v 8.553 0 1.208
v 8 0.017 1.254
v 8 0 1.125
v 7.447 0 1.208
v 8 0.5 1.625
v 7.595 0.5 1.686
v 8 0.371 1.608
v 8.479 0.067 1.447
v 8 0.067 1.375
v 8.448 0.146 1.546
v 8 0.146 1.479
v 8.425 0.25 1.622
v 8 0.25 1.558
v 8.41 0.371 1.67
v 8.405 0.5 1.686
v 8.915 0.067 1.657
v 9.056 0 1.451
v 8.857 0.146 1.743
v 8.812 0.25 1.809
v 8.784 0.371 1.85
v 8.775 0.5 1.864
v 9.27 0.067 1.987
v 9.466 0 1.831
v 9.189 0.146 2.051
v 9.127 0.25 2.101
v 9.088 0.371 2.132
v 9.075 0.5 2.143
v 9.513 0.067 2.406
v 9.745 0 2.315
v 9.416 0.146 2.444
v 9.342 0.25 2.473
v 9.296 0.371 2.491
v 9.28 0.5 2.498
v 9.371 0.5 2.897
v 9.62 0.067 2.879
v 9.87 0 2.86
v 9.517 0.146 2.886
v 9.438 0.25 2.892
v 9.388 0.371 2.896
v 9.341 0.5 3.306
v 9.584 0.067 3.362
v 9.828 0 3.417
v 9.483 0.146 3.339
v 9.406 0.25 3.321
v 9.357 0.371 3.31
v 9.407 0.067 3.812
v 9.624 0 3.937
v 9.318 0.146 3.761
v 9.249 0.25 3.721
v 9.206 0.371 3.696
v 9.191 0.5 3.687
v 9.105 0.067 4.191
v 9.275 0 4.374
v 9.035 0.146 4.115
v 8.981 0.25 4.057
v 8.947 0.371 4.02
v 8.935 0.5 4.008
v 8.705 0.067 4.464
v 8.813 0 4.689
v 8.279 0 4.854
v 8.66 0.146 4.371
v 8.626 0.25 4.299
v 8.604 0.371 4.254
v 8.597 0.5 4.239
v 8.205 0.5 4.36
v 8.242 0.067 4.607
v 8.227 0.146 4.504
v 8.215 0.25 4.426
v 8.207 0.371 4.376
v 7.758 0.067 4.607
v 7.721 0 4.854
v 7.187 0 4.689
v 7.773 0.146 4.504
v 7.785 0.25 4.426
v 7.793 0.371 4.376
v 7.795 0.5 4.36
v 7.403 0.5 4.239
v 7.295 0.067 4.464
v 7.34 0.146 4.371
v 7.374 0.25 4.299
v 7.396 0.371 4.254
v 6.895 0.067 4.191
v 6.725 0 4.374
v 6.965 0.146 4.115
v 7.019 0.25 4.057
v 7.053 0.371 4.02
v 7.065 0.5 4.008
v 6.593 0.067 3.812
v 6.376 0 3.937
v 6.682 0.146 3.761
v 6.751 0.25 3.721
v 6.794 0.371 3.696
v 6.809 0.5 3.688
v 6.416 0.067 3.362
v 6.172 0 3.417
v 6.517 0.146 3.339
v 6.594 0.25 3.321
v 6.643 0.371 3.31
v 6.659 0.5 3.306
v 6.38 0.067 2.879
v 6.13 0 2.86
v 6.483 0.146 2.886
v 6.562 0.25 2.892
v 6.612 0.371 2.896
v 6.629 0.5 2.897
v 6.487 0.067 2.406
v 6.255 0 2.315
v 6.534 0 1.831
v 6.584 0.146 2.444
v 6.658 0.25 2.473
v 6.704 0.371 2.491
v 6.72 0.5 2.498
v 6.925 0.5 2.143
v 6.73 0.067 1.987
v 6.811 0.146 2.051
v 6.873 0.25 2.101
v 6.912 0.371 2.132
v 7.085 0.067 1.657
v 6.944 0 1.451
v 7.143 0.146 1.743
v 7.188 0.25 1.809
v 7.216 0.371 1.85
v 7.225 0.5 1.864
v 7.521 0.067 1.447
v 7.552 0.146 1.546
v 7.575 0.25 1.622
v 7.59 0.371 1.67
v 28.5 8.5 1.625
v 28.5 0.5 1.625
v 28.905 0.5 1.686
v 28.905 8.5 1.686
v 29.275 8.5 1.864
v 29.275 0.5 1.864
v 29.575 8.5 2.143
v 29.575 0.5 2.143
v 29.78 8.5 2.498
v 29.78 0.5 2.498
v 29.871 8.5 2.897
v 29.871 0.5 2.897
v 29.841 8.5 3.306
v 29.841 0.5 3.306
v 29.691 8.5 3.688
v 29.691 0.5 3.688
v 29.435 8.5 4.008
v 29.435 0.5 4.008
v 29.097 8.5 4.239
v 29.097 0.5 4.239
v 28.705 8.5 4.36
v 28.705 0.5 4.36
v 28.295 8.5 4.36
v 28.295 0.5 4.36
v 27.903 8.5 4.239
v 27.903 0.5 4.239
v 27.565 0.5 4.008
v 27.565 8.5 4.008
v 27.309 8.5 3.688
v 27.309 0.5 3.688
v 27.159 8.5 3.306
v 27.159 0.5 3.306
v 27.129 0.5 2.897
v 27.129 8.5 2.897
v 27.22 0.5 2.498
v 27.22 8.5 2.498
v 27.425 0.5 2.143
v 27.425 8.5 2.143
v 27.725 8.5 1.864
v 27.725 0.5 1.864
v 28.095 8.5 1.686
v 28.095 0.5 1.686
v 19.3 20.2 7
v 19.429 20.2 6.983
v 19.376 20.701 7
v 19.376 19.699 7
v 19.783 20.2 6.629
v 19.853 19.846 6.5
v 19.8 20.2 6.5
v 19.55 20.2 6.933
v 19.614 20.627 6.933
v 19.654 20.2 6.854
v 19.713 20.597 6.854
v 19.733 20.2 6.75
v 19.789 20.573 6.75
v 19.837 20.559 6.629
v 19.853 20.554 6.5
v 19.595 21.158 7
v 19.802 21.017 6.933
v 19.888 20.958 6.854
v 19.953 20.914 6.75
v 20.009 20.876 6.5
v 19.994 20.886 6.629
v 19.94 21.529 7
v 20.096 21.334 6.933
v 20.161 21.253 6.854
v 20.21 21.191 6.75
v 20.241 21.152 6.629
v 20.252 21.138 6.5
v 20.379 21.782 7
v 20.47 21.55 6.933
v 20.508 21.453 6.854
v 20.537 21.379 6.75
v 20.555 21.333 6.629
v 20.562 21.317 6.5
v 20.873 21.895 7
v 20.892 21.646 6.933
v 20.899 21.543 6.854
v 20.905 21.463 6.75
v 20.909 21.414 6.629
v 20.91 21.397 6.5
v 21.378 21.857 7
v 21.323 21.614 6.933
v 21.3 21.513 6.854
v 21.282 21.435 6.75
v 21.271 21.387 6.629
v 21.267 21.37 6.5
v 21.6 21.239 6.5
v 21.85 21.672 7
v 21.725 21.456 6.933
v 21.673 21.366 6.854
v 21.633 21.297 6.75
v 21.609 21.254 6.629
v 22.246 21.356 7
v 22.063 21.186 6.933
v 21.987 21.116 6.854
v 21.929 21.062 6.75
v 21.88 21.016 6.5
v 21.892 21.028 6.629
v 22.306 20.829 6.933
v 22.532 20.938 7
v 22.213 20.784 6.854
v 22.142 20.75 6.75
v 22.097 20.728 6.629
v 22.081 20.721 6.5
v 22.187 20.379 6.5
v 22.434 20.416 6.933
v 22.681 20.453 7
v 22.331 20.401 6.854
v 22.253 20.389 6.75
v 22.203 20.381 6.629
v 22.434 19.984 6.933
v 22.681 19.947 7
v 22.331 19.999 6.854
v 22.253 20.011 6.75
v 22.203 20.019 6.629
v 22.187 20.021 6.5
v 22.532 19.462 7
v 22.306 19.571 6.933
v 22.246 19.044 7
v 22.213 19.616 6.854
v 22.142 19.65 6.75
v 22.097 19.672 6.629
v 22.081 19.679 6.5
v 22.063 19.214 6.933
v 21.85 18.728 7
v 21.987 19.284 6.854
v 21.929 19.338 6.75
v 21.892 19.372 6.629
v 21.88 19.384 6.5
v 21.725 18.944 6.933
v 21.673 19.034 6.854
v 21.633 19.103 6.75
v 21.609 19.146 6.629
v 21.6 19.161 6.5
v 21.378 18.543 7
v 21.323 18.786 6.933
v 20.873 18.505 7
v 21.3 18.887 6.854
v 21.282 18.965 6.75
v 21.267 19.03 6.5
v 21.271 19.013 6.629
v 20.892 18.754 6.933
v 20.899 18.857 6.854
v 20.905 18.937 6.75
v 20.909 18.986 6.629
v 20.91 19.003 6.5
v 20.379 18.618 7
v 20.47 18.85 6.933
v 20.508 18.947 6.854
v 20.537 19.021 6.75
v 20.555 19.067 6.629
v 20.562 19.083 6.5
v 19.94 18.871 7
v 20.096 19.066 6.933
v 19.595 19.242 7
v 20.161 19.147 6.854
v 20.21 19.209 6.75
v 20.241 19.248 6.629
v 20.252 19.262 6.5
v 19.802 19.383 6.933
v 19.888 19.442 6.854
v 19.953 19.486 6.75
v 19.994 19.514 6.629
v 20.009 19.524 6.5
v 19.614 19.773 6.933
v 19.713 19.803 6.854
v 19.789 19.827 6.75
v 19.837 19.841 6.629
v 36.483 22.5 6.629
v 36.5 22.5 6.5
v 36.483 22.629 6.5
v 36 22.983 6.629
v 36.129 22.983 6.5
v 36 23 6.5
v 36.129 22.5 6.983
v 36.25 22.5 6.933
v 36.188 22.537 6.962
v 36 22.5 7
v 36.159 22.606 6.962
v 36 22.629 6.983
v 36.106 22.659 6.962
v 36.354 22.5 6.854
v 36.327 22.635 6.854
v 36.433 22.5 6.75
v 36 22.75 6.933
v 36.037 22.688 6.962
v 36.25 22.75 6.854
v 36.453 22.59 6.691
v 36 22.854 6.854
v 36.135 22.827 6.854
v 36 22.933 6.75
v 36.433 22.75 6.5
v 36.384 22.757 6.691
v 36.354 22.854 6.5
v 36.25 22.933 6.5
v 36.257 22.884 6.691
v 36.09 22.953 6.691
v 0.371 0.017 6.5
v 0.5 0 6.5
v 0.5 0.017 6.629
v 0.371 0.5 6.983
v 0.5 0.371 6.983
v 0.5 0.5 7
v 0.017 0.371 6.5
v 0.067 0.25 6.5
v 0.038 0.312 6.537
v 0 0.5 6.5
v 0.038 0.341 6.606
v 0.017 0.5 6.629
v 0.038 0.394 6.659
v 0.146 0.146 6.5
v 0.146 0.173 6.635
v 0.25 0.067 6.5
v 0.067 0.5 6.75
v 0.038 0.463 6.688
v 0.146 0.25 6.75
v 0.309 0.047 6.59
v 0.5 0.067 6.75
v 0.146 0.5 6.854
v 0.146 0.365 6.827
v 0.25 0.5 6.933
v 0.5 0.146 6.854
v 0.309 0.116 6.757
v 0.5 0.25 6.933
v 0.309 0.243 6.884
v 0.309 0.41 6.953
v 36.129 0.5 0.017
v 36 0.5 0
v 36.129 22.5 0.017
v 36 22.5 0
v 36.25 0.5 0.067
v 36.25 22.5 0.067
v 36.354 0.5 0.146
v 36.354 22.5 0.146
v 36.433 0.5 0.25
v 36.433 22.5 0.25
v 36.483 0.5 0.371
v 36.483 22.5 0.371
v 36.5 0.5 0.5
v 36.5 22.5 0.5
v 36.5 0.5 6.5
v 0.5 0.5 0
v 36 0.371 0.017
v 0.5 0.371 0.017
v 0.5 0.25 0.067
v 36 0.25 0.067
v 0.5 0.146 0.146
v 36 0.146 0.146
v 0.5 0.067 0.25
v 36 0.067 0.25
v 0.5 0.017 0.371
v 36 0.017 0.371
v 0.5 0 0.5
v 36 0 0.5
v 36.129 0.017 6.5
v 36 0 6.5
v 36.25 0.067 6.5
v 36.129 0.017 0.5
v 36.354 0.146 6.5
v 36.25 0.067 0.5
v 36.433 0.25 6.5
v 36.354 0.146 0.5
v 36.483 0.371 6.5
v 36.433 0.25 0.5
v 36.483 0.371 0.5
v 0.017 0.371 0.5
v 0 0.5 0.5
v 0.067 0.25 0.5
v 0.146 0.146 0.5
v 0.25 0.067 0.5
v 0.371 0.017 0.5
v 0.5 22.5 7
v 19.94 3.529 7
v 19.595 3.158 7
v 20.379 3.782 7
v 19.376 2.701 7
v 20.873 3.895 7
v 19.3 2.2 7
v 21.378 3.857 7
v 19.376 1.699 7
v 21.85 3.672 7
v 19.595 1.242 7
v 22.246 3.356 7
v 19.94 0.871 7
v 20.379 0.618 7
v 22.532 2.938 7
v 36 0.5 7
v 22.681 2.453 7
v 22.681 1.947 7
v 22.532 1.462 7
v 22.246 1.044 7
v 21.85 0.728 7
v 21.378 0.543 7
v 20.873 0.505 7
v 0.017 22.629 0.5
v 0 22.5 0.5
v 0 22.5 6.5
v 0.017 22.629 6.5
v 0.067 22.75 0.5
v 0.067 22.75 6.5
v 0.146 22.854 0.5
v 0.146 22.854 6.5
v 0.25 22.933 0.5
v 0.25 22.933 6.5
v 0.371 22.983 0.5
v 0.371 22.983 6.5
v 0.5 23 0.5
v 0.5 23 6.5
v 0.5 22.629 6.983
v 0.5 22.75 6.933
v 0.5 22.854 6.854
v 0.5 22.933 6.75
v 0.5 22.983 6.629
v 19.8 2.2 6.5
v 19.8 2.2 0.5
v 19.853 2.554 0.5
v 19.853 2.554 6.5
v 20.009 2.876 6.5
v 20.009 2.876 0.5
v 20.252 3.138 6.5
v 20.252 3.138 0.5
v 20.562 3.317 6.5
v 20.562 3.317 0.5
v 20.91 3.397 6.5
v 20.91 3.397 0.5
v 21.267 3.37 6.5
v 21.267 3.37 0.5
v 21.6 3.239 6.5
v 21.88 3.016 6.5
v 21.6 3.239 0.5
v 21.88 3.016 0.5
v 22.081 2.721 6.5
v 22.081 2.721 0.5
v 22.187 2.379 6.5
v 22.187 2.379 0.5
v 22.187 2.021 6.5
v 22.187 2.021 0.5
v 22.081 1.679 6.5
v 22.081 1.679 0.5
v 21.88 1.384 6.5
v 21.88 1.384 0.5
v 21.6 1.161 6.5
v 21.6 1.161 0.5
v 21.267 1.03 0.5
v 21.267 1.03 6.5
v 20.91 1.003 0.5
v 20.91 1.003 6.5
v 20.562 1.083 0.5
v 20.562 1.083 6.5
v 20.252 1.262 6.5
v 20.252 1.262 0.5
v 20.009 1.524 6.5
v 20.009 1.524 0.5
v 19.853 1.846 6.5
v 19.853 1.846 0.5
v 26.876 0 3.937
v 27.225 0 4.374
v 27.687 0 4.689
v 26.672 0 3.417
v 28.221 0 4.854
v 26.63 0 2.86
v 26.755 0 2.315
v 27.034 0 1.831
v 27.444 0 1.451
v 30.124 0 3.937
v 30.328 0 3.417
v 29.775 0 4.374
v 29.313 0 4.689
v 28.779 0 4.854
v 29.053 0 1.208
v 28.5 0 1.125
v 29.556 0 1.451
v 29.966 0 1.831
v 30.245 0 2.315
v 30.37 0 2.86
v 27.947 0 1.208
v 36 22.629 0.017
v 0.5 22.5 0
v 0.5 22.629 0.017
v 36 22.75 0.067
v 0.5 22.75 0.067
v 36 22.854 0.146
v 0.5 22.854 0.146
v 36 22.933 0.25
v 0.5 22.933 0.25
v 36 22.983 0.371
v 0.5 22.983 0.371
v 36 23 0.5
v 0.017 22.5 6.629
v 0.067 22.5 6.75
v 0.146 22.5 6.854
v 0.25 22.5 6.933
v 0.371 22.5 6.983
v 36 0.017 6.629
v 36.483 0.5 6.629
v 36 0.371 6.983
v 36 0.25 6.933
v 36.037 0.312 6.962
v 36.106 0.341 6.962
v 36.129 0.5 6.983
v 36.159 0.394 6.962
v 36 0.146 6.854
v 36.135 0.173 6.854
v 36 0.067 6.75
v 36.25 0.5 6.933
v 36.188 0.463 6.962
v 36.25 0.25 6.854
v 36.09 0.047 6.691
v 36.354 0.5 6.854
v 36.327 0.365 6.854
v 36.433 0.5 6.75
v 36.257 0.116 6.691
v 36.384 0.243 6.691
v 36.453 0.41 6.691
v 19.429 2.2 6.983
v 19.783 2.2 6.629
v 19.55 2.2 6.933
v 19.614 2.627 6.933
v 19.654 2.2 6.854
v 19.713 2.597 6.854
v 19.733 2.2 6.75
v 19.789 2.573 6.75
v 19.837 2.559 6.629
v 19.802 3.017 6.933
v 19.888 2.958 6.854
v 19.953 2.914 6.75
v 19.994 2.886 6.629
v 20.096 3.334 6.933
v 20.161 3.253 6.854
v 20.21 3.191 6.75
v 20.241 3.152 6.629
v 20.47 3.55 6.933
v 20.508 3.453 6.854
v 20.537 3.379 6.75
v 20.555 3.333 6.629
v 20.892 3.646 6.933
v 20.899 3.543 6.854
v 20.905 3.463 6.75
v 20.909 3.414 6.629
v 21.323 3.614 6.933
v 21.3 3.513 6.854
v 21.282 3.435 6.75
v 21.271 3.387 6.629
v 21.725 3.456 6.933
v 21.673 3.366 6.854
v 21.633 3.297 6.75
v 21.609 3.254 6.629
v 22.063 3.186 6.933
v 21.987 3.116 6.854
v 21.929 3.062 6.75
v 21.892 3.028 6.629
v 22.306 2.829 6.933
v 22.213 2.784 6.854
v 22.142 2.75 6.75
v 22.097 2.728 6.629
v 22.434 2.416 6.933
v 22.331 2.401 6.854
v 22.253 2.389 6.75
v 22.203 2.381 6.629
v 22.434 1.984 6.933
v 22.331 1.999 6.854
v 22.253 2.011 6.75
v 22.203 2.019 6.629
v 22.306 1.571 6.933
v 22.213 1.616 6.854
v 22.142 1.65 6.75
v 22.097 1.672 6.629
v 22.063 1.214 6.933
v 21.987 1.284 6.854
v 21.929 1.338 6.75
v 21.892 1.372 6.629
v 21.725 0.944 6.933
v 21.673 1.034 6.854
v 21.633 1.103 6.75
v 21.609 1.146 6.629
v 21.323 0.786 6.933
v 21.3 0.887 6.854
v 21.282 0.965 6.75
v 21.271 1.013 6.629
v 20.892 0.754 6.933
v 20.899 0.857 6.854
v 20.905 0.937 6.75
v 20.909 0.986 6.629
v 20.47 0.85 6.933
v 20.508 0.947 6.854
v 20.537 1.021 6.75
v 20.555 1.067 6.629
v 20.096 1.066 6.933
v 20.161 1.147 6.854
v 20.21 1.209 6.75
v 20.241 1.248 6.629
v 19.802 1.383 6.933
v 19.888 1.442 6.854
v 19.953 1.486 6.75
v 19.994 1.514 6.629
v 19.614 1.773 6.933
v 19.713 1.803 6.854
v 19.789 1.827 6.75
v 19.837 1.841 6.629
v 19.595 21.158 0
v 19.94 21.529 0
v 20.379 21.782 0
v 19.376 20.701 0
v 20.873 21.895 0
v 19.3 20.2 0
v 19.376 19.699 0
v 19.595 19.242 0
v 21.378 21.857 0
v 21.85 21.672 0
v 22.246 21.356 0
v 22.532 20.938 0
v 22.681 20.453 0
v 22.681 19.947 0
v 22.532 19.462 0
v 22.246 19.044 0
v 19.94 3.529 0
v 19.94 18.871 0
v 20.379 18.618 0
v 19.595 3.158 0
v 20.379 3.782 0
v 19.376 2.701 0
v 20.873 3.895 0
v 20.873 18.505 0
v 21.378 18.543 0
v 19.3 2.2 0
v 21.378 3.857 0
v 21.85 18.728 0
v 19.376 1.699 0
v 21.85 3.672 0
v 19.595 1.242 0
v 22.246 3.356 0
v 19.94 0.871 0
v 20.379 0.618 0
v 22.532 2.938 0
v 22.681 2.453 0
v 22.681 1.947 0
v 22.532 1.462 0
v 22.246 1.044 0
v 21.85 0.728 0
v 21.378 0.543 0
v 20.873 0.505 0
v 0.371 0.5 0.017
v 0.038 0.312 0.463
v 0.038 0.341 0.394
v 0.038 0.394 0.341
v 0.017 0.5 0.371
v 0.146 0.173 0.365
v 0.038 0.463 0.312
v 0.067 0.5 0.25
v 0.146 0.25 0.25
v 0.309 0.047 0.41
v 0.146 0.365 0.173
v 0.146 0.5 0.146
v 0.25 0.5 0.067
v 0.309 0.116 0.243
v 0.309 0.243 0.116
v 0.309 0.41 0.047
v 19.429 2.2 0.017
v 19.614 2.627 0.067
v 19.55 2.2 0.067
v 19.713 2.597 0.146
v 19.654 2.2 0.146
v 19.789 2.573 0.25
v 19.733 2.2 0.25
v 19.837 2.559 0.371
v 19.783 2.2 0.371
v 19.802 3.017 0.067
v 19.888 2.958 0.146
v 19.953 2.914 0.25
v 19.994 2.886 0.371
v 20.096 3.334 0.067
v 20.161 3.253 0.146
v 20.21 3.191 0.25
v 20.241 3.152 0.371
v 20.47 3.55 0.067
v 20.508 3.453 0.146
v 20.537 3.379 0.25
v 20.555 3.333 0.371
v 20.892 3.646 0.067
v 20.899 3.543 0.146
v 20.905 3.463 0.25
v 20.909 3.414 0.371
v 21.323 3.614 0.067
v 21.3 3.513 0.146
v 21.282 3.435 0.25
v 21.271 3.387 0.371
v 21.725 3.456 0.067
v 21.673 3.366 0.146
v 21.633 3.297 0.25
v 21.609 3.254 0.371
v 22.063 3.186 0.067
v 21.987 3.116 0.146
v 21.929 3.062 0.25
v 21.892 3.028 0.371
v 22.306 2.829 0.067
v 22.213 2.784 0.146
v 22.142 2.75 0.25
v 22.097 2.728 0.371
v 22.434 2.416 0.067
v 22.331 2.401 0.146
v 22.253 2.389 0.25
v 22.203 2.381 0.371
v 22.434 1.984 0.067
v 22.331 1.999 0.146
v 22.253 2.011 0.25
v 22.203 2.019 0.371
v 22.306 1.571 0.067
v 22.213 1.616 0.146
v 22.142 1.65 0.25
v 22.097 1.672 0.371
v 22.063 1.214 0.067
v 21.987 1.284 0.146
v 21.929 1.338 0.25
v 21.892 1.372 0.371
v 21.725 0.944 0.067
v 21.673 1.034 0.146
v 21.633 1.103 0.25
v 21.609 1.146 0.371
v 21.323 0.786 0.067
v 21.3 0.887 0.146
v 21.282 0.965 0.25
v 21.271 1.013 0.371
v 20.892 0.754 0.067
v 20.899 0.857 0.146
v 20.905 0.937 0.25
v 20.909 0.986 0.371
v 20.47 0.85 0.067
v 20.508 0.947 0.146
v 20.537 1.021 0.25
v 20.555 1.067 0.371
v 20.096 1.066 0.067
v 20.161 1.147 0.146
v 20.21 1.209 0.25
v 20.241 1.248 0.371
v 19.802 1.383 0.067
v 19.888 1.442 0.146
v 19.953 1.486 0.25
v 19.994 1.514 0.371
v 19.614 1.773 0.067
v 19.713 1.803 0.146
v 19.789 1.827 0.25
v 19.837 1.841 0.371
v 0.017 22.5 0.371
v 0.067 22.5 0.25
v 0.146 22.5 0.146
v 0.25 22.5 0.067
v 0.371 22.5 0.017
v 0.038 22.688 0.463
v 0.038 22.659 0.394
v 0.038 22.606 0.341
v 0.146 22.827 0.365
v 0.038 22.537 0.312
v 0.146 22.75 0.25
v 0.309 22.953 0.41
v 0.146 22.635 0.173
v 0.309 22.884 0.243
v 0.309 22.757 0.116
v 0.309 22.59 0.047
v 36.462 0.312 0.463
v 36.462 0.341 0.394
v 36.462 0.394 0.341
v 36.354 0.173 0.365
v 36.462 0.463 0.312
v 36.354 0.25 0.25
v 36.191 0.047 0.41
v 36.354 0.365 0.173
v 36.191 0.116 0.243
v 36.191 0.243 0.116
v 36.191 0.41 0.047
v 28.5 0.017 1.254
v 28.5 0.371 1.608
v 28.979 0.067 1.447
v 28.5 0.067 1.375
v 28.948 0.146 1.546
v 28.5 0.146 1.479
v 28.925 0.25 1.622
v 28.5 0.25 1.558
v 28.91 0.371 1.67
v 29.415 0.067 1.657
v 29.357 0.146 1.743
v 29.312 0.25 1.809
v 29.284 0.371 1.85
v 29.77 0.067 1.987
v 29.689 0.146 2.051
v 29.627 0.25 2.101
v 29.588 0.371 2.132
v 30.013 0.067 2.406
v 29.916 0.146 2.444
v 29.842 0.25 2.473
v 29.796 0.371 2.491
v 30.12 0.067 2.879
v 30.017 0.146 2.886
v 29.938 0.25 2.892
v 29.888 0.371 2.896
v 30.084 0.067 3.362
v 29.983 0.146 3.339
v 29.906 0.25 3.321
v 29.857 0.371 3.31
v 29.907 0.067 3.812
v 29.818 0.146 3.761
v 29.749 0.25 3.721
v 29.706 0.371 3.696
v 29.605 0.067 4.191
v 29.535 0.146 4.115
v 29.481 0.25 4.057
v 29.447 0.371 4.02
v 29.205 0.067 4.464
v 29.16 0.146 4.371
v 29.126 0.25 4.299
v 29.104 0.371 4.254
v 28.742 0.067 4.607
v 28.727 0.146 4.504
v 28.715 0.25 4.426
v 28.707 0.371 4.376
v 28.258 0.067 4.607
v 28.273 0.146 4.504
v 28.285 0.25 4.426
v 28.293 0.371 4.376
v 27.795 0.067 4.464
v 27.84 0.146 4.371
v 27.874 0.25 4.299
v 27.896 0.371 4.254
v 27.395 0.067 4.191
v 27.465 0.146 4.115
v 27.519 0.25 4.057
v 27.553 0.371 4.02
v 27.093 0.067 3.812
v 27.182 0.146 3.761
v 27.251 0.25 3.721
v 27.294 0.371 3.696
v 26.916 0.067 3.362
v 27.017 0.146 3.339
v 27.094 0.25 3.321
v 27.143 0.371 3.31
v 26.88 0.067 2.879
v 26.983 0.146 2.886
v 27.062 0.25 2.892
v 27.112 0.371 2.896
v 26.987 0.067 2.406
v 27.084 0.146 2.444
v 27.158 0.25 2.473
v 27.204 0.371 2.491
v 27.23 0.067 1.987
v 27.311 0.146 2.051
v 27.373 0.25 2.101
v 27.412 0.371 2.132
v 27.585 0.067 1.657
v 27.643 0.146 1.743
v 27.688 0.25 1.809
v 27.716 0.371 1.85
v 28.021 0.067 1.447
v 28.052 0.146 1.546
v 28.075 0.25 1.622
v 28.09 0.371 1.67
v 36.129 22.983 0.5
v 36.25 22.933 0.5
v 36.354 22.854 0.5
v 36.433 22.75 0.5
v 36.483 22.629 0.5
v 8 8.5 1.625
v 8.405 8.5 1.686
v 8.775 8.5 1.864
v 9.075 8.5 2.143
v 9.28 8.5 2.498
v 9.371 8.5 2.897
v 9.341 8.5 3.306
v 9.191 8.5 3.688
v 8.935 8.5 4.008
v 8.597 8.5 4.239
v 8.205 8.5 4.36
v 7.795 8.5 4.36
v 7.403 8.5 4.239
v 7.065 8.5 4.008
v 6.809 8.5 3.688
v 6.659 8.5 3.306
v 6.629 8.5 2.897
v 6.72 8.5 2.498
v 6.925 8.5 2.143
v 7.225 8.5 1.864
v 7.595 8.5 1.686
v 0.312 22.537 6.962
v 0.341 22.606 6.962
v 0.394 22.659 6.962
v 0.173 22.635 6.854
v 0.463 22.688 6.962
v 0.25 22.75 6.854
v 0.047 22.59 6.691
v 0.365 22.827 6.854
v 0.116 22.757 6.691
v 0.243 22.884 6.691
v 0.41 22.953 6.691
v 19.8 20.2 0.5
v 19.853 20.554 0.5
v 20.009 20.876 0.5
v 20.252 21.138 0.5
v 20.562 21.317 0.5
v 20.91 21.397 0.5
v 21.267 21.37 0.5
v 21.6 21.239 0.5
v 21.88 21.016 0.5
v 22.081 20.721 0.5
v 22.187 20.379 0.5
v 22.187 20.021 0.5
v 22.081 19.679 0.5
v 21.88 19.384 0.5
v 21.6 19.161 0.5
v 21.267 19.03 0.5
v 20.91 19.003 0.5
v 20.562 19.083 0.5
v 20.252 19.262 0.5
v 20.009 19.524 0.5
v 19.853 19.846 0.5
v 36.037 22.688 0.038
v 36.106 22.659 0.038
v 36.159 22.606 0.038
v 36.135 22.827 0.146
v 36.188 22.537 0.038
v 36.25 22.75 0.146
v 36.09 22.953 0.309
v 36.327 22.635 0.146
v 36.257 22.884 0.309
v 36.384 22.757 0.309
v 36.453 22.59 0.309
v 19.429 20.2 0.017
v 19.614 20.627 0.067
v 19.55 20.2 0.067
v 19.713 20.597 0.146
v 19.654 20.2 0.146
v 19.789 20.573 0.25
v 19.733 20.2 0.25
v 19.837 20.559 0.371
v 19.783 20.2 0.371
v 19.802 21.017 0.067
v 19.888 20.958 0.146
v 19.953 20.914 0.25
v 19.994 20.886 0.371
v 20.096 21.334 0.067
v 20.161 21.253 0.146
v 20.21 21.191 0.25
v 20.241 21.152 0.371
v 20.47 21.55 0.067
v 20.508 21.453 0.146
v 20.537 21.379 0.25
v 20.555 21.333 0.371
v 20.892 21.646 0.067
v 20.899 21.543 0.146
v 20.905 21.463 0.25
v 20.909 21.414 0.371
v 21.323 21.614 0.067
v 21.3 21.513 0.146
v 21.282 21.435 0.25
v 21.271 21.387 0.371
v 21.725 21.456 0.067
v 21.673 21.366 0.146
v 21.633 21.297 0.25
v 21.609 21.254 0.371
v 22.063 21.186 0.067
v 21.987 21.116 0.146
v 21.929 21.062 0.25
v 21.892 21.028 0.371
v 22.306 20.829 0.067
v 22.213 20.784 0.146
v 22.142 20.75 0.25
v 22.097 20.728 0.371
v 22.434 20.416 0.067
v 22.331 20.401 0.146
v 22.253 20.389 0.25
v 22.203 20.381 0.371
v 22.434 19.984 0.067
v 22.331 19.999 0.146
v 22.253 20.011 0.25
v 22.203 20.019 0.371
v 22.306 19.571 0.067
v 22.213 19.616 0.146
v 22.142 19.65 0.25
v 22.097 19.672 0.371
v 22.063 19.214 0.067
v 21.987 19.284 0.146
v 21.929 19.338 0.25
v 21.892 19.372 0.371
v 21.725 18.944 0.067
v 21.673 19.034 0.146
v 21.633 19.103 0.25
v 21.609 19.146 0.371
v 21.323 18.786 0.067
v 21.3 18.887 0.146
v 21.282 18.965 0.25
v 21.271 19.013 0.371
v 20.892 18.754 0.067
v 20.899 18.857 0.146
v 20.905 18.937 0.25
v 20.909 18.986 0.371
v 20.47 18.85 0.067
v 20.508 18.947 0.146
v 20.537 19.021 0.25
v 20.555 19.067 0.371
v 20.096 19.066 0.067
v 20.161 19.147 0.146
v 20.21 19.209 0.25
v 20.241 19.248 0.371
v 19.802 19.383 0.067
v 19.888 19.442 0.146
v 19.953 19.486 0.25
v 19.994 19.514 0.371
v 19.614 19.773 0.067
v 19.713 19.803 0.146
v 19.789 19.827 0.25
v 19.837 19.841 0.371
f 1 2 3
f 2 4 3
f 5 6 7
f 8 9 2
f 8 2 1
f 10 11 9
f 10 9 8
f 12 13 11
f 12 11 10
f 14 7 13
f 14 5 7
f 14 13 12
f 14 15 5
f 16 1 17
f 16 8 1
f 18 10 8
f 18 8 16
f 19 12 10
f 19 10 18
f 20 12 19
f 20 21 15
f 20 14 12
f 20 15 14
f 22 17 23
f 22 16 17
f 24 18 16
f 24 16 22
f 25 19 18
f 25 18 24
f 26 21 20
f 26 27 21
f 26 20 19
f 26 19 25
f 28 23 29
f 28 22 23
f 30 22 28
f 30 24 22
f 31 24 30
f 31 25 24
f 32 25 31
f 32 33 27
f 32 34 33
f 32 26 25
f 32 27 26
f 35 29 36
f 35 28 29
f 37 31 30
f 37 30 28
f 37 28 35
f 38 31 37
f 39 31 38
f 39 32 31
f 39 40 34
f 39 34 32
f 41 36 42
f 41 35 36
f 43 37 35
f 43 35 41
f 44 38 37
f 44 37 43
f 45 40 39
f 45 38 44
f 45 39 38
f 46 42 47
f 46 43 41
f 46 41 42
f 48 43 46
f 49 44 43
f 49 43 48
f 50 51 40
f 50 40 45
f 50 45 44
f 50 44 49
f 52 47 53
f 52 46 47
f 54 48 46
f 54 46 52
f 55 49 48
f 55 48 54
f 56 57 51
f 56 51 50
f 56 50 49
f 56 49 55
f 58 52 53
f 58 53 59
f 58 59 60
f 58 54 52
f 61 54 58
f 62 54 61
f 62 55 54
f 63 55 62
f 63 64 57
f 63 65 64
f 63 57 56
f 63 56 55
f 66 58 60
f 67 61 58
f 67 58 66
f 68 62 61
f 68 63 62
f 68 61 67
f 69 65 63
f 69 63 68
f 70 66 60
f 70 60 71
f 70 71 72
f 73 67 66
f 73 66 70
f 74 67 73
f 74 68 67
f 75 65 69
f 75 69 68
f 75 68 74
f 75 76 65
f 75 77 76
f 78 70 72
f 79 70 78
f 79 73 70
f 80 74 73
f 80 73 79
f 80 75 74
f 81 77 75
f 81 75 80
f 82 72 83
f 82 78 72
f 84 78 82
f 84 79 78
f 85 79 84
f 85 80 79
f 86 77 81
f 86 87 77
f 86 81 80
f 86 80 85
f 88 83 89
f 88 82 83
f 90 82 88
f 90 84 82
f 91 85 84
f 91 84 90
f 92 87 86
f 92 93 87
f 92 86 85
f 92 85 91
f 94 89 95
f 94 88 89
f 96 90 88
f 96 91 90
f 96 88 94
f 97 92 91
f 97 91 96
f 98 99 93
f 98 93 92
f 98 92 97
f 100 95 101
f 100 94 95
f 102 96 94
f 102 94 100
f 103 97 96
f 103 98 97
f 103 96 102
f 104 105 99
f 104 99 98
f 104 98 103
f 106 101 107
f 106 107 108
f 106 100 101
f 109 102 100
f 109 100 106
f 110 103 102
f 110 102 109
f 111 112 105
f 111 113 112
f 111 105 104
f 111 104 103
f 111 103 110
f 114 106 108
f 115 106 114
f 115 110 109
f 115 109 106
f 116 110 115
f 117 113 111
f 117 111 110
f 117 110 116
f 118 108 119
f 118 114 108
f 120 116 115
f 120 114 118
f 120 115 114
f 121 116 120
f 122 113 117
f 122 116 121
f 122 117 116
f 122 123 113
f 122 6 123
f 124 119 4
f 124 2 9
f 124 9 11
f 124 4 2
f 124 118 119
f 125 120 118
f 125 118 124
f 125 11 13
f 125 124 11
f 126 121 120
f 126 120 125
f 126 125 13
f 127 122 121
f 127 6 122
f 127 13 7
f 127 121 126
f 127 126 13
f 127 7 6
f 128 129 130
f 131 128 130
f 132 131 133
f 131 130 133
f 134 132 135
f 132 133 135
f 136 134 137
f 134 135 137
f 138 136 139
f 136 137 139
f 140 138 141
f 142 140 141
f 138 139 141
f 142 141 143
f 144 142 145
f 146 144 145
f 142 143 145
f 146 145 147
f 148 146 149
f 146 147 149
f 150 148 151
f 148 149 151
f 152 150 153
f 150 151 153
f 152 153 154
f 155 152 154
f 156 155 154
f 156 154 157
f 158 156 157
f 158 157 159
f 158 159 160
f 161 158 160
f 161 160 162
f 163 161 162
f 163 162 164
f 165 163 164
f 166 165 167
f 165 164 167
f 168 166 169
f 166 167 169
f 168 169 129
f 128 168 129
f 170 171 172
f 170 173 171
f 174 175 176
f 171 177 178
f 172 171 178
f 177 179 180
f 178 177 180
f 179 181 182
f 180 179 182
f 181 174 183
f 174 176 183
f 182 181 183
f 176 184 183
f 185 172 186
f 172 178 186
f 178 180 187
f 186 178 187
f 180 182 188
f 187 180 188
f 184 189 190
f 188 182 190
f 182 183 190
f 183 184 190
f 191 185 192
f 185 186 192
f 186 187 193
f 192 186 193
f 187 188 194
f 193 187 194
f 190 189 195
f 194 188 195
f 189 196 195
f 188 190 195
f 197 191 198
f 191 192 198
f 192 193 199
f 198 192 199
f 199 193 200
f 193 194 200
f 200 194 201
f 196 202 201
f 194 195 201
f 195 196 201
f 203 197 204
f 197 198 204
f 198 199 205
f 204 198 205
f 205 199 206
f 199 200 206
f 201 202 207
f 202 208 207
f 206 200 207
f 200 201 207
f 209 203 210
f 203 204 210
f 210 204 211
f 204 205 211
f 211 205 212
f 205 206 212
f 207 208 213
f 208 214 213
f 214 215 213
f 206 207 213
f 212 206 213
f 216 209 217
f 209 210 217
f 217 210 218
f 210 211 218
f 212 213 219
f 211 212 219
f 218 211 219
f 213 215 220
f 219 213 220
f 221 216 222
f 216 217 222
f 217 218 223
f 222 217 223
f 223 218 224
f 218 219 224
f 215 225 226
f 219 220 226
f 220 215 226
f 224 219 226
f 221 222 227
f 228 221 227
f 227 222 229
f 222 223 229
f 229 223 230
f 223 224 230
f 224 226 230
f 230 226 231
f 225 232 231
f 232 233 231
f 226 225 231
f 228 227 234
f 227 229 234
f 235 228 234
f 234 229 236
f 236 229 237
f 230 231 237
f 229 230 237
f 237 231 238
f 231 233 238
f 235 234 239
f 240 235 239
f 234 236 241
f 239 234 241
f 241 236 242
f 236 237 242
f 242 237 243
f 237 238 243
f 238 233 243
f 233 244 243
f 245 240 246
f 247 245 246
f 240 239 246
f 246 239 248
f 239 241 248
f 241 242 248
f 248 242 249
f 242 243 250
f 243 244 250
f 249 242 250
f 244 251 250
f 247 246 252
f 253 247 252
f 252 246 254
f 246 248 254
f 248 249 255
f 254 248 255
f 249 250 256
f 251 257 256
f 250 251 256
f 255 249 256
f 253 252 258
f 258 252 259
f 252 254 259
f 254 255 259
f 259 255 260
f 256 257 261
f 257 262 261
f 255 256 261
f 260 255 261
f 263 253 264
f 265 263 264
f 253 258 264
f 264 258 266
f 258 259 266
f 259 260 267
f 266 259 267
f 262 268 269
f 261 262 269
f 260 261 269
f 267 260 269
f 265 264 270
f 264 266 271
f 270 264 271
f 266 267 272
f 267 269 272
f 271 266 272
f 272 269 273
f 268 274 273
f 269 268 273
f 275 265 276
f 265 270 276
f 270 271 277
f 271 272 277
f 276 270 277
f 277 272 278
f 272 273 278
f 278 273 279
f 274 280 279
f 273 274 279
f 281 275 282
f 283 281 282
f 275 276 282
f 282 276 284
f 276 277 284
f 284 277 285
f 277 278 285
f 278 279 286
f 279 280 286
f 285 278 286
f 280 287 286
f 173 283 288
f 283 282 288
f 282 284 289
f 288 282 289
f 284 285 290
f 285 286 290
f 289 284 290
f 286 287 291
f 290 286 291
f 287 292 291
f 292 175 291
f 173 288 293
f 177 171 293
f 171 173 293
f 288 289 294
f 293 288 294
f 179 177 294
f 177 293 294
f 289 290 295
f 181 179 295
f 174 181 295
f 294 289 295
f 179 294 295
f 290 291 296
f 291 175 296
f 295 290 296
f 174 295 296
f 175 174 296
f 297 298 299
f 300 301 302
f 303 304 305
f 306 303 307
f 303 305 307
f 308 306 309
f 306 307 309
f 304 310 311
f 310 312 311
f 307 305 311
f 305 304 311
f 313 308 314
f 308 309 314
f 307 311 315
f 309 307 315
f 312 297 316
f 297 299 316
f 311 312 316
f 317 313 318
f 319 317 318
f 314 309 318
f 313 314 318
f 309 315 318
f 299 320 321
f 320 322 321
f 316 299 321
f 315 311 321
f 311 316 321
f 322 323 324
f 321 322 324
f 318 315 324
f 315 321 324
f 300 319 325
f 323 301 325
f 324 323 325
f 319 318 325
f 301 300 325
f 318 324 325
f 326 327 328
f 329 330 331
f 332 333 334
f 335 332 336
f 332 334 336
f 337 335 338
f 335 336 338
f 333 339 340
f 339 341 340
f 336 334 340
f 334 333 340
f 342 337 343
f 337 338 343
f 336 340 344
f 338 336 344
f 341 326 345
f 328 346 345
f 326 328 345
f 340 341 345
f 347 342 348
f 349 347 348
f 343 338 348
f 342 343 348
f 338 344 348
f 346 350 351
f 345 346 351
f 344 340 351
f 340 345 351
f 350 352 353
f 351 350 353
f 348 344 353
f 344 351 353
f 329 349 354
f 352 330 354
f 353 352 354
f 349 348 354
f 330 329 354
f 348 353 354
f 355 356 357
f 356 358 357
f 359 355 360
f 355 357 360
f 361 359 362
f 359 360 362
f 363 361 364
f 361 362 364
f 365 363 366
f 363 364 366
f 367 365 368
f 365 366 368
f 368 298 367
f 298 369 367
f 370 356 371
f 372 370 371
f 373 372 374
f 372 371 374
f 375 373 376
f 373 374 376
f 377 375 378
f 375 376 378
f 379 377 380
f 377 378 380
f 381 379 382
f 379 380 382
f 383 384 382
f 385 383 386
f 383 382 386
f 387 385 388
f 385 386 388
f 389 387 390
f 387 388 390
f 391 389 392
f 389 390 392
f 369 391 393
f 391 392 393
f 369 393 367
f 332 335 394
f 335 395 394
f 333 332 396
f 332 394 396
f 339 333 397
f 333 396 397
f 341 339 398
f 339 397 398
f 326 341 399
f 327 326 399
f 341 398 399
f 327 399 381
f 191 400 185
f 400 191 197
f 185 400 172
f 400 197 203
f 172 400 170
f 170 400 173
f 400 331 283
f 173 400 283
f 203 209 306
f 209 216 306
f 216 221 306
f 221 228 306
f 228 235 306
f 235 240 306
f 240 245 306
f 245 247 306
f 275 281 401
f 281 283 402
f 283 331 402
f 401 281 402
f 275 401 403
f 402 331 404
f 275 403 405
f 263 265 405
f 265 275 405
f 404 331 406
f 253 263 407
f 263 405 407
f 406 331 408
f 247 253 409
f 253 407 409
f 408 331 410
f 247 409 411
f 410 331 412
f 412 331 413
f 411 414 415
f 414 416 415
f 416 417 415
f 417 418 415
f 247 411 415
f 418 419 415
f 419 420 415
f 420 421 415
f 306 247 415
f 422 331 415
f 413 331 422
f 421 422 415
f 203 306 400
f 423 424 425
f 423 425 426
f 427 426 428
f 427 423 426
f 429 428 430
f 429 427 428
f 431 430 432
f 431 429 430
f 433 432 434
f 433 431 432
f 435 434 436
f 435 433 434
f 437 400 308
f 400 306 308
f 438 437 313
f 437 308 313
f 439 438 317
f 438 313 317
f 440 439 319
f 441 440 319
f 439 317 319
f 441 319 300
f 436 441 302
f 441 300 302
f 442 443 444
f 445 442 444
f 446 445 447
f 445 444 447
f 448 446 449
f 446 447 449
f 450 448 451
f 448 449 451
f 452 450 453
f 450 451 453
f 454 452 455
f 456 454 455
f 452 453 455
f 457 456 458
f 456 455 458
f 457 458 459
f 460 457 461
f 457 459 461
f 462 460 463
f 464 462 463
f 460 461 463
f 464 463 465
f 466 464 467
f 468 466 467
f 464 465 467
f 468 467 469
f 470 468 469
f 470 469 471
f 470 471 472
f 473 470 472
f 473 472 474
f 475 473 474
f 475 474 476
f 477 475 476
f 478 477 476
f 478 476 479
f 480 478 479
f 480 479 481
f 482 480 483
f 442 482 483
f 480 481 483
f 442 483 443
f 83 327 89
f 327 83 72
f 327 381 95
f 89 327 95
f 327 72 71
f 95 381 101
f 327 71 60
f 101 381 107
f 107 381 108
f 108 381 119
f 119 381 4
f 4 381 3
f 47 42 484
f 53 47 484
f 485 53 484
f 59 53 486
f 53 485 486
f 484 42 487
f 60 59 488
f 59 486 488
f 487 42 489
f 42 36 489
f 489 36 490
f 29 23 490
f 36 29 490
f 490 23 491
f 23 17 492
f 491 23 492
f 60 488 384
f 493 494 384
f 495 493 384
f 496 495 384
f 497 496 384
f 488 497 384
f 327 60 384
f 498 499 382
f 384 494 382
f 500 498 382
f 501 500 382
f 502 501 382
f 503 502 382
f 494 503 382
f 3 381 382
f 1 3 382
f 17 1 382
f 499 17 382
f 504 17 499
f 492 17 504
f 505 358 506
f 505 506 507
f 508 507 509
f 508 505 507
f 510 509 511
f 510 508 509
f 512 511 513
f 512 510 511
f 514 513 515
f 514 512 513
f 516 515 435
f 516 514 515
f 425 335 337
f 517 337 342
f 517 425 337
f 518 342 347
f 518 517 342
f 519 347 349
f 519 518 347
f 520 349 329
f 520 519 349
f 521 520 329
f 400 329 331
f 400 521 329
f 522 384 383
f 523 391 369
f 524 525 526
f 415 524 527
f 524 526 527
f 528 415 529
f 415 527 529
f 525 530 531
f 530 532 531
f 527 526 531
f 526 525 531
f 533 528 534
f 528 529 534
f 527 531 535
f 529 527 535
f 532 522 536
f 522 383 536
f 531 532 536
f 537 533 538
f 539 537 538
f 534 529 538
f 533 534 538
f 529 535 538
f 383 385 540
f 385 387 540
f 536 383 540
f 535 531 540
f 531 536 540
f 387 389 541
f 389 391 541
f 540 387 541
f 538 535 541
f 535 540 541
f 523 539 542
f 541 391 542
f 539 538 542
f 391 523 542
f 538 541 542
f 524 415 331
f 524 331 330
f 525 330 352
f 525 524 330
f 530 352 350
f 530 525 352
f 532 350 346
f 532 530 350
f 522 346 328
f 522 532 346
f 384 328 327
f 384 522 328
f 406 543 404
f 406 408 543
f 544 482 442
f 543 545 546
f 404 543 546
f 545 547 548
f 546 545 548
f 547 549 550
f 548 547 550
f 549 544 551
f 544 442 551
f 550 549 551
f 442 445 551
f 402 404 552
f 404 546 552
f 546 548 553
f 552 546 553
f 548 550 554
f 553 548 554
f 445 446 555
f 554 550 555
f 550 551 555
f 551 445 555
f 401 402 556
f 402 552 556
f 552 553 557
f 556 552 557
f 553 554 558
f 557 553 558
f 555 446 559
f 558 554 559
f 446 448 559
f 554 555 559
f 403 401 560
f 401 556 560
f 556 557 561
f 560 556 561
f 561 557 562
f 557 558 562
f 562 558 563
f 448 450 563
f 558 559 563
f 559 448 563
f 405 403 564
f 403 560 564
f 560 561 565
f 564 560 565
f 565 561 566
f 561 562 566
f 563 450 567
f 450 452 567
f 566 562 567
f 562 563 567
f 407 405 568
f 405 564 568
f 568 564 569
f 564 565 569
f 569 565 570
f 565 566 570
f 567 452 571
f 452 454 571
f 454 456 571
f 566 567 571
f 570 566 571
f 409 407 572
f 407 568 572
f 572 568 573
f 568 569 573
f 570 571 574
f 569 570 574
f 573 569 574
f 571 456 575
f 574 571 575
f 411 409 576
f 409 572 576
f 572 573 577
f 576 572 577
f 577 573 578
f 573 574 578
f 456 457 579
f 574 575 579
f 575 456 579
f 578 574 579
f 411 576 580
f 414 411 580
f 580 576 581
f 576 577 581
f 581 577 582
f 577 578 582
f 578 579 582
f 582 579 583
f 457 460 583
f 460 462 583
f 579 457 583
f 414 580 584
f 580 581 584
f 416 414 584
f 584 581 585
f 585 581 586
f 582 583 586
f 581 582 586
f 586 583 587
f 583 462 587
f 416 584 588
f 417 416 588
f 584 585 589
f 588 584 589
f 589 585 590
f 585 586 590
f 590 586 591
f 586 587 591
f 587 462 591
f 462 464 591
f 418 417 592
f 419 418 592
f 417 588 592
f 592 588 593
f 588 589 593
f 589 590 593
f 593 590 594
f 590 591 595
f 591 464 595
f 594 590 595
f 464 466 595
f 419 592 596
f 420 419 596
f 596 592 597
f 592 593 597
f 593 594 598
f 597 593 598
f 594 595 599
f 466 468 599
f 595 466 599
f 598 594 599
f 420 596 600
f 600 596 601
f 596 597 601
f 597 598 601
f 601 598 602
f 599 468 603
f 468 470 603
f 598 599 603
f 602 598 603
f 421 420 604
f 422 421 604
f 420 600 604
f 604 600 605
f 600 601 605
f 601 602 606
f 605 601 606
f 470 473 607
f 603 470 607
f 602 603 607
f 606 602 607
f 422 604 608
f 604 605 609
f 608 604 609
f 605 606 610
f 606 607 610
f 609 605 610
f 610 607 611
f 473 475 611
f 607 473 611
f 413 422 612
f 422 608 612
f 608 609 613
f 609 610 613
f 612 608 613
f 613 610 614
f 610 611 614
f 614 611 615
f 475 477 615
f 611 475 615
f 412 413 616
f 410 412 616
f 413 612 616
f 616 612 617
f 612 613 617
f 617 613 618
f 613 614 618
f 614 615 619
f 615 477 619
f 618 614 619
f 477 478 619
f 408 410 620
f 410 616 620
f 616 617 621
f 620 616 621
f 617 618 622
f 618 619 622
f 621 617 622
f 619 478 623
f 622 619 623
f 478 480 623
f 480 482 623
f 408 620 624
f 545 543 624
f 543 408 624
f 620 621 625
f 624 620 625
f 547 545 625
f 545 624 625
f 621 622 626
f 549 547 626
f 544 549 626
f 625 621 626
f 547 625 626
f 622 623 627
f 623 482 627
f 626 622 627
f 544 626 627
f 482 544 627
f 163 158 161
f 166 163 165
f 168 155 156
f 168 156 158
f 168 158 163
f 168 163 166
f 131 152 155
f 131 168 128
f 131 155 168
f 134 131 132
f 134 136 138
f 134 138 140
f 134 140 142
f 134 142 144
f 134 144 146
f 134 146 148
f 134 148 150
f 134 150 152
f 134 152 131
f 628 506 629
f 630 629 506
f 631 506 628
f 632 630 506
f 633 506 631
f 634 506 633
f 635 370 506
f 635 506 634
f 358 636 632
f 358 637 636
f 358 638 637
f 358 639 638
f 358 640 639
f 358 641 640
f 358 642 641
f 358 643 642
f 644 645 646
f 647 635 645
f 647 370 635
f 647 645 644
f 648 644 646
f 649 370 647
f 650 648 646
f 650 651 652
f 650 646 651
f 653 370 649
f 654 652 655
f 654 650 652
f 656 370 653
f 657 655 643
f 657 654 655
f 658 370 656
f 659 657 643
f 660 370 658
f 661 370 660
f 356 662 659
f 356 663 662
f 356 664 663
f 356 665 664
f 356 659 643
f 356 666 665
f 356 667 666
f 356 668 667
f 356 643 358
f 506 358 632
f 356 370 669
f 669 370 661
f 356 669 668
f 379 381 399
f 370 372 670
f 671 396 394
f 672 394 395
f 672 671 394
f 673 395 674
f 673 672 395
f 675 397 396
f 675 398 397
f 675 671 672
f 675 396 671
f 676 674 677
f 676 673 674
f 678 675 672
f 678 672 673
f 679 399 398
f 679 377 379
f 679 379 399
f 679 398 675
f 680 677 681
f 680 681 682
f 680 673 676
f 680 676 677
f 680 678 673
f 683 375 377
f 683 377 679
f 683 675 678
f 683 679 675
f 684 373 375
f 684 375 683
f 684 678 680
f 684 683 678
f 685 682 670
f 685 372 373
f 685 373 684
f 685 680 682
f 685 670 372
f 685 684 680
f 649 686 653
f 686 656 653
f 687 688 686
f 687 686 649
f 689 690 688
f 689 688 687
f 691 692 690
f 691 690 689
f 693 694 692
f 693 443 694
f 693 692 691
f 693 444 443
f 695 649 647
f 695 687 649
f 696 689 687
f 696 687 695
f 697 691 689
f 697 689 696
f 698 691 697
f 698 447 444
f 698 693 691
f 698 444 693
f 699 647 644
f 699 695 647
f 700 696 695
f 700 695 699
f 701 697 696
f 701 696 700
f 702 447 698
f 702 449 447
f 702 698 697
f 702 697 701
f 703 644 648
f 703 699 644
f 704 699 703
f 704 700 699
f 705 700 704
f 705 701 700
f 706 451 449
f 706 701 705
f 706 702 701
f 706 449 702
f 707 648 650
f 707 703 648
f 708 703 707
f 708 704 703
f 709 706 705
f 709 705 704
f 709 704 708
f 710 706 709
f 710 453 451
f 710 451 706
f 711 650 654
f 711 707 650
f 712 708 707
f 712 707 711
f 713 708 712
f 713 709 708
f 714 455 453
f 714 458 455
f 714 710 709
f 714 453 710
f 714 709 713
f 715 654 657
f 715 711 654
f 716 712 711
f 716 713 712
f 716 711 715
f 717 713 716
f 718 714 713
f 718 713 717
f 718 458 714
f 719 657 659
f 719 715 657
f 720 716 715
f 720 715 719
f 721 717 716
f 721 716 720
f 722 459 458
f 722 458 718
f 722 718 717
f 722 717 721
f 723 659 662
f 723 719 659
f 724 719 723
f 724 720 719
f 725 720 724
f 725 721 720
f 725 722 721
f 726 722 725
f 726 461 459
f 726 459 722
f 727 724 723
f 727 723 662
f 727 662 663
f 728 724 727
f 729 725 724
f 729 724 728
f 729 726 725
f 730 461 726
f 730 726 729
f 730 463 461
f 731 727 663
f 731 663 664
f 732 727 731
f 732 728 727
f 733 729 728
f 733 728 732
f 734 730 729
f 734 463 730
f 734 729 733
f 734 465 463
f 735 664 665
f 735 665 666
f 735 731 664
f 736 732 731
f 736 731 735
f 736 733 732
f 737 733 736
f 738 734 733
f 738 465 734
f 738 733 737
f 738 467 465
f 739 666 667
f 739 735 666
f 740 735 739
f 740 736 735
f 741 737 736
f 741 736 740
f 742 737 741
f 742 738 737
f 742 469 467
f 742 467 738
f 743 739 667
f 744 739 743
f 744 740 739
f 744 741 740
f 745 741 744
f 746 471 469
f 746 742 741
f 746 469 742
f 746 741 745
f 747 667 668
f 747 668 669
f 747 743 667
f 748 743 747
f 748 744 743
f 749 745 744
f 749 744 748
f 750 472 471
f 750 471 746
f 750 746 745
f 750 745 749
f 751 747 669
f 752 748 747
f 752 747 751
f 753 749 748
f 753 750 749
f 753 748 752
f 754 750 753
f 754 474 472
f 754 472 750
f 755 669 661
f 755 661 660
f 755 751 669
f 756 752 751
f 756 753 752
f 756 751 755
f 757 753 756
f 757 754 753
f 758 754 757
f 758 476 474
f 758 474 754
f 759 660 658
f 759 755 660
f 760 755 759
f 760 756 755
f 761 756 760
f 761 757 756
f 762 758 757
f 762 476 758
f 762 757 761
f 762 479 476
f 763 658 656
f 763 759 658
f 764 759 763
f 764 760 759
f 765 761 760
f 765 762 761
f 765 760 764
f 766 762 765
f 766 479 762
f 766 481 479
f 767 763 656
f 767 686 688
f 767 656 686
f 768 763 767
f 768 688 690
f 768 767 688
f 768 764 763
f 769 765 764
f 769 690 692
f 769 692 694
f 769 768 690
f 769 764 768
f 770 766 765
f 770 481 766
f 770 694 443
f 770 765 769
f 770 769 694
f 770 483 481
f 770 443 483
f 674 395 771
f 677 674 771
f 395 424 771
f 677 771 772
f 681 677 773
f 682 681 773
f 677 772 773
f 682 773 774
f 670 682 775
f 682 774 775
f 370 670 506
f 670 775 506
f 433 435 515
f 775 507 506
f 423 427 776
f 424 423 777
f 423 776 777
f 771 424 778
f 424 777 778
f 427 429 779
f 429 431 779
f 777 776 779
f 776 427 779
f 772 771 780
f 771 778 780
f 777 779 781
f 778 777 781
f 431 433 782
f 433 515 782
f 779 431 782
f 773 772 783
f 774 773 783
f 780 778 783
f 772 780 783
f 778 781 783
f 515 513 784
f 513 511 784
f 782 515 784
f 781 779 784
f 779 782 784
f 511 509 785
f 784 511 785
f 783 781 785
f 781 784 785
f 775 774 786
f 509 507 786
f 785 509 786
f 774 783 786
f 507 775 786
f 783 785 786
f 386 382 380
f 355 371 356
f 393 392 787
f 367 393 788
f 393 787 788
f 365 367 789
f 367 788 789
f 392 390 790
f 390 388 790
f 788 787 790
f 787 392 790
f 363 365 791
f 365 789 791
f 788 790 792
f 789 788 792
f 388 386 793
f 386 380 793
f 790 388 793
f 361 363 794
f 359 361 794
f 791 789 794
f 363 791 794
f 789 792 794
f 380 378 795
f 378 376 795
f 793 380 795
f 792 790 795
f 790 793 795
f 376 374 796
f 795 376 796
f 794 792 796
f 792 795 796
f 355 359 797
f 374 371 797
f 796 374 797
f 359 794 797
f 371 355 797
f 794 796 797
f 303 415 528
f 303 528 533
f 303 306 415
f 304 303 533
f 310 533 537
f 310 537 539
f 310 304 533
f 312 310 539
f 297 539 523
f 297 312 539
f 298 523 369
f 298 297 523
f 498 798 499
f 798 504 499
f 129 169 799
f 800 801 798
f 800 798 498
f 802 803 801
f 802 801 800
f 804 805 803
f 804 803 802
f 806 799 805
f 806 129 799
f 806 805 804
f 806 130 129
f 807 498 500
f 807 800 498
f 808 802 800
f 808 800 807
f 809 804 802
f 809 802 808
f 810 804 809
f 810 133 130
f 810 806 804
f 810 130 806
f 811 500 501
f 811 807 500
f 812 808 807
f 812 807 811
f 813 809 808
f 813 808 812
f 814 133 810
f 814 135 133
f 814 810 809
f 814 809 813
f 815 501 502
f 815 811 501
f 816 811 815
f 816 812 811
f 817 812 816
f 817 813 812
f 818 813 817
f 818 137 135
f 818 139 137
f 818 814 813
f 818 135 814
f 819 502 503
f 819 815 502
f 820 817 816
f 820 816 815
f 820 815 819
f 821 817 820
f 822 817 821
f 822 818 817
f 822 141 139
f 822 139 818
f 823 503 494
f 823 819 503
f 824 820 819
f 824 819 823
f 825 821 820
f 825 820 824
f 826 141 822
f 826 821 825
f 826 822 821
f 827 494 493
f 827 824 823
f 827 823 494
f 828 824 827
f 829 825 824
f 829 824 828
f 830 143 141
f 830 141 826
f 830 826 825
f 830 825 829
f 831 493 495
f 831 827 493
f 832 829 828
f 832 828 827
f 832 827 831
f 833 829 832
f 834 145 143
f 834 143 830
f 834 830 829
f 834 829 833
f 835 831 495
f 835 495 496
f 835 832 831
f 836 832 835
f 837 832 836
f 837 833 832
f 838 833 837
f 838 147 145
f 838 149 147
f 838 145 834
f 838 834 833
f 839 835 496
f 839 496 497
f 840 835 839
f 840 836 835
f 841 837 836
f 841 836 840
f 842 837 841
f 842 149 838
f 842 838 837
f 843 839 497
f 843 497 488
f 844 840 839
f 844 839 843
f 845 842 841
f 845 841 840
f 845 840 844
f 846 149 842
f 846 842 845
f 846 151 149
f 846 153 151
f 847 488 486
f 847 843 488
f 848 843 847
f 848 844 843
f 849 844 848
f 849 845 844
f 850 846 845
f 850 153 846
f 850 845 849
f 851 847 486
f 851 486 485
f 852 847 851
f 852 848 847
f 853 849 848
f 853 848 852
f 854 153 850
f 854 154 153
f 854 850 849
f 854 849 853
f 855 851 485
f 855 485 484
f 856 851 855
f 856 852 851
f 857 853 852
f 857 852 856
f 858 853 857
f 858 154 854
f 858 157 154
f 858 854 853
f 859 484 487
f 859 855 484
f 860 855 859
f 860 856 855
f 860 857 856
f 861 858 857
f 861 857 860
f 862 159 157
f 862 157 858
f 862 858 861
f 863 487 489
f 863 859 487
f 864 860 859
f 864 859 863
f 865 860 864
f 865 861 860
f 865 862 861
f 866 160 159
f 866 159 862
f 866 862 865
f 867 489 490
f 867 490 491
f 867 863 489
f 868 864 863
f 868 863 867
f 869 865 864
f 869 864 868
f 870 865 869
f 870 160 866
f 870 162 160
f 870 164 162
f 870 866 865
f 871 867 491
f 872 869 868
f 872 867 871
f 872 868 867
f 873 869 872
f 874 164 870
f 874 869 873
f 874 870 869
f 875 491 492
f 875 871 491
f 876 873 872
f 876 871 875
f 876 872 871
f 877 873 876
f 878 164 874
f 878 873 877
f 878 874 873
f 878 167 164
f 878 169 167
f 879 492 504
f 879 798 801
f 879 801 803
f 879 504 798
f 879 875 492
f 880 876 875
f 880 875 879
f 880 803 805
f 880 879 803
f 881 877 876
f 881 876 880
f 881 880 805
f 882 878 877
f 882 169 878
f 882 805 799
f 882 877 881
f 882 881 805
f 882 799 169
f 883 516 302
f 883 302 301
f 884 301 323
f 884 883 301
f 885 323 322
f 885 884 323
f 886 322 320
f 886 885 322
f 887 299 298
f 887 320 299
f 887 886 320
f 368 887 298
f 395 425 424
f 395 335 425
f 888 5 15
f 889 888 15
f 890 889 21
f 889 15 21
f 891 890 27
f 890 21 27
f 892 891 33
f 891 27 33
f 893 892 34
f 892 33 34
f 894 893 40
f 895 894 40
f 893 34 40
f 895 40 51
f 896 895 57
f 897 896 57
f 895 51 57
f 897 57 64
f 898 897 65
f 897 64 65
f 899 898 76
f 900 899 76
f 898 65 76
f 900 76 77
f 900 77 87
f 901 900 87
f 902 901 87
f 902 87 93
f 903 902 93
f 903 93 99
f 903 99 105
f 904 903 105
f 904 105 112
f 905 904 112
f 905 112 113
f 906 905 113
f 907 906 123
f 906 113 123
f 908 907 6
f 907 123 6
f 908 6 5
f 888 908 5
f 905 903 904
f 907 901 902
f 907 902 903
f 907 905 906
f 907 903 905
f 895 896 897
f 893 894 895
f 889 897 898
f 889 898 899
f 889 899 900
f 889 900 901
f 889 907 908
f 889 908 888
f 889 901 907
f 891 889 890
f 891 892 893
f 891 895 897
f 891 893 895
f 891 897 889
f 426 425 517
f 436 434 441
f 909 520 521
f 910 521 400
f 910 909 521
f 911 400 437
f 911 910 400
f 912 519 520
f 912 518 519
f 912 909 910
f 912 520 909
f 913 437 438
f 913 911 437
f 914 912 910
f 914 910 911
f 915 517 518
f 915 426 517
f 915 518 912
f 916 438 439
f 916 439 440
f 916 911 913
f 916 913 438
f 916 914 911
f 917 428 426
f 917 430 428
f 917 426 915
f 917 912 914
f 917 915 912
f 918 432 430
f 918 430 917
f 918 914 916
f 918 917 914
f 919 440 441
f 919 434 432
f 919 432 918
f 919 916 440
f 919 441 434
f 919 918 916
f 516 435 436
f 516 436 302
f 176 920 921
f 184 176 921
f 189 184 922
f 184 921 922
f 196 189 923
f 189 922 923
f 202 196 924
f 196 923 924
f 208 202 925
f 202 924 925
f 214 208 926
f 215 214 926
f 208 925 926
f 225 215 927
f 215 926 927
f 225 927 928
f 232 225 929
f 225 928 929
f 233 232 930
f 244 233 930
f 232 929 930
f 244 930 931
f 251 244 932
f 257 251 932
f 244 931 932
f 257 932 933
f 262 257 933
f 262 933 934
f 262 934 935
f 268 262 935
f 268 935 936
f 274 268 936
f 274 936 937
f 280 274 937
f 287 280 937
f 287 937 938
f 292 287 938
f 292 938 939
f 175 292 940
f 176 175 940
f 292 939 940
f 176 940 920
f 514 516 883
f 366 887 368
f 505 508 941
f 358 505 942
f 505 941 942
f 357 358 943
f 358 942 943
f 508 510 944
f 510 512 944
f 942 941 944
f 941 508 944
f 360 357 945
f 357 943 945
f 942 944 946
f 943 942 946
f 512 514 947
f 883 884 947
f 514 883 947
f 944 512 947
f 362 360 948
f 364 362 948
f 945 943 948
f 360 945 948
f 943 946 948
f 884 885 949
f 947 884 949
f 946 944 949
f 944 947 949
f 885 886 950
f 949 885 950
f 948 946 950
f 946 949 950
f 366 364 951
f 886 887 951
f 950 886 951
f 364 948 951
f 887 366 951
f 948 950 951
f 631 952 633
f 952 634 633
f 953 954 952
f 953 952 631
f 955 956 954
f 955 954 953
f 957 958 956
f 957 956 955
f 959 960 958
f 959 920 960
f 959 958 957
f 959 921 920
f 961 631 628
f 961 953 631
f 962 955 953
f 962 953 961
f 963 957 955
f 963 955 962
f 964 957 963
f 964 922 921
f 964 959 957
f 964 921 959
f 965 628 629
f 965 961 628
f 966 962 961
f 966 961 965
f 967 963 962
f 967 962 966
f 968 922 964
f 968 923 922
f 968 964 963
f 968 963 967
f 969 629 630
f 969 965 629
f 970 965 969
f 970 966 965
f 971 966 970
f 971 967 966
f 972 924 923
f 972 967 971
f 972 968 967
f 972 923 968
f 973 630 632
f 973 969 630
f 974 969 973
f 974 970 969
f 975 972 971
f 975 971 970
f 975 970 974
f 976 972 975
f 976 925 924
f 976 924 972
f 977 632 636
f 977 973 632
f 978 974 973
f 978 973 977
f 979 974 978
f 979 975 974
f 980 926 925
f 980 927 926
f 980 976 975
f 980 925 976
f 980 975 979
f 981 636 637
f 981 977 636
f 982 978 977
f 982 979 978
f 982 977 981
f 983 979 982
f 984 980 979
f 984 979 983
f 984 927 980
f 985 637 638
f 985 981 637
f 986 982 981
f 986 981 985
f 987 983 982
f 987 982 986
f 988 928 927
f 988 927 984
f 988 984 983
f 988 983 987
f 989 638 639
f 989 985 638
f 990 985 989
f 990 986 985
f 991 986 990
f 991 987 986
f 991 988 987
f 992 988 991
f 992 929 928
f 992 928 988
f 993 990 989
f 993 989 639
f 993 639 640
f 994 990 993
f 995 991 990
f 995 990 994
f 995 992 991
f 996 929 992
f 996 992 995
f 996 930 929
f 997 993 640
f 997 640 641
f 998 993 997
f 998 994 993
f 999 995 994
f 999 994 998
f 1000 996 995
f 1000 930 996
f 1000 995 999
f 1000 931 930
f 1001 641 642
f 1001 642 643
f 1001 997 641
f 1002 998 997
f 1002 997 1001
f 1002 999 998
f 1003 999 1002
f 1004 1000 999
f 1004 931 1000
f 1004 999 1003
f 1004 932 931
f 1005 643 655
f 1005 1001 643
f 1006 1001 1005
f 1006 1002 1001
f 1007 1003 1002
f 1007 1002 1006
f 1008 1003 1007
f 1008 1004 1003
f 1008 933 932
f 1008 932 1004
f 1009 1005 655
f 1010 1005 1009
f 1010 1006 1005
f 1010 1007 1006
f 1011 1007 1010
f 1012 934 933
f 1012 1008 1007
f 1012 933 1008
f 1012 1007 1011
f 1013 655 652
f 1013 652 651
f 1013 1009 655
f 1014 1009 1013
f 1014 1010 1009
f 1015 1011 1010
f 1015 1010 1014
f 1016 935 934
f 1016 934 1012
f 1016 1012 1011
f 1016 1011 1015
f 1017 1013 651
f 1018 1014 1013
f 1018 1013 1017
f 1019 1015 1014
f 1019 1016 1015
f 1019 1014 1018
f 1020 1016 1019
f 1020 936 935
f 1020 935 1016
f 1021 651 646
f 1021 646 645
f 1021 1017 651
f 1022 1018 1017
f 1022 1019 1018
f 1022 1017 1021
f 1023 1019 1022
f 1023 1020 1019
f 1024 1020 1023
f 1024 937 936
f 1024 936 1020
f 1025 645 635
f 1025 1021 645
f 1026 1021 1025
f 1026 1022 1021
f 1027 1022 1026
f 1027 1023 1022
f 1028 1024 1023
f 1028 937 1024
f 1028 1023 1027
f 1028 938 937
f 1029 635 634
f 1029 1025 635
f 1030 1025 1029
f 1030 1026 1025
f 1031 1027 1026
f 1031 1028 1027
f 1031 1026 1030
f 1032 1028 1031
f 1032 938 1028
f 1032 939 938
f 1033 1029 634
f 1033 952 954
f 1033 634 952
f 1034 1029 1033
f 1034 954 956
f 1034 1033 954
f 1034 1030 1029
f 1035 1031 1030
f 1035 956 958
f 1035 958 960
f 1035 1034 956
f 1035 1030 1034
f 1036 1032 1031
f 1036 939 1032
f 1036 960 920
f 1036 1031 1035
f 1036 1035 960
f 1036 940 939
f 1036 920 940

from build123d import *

# Parameters (mm, degrees)
SKETCH1_W           = 36.5
SKETCH1_H           = 7
BOSS_EXTRUDE1_DEPTH = 23
SKETCH2_R           = 1.375
CUT_EXTRUDE1_DEPTH  = 8.5
SKETCH4_R           = 1.2
CUT_EXTRUDE2_DEPTH  = 7
FILLET1_R           = 0.5


with BuildPart() as part:
    # Sketch1 → Boss-Extrude1 (new body)
    with BuildSketch(Plane(origin=(0, 0, 0), x_dir=(1, 0, 0), z_dir=(0, 1, 0))):
        with Locations((18.25, -3.5)):
            Rectangle(SKETCH1_W, SKETCH1_H)
    extrude(amount=BOSS_EXTRUDE1_DEPTH)

    # Sketch2 → Cut-Extrude1 (cut)
    with BuildSketch(Plane.XZ):
        with Locations(Location((8, 3, 0), (0, 0, 270))):
            Circle(SKETCH2_R)
        with Locations(Location((28.5, 3, 0), (0, 0, 270))):
            Circle(SKETCH2_R)
    extrude(amount=-CUT_EXTRUDE1_DEPTH, mode=Mode.SUBTRACT)

    # Sketch4 → Cut-Extrude2 (cut)
    with BuildSketch(Plane(origin=(0, 0, 0), x_dir=(-1, 0, 0), z_dir=(0, 0, -1))):
        with Locations((-21, 2.2)):
            Circle(SKETCH4_R)
        with Locations((-21, 20.2)):
            Circle(SKETCH4_R)
    extrude(amount=-CUT_EXTRUDE2_DEPTH, mode=Mode.SUBTRACT)

    # Fillet1
    fillet1_edges = [part.edges().sort_by_distance(p)[0] for p in [
        (36.5, 23, 3.5),
        (8, 0, 4.375),
        (18.25, 23, 0),
        (28.5, 0, 4.375),
        (22.2, 2.2, 7),
        (22.2, 2.2, 0),
        (22.2, 20.2, 7),
        (22.2, 20.2, 0),
        (0, 23, 3.5),
        (18.25, 0, 0),
        (36.5, 0, 3.5),
        (18.25, 0, 7),
        (0, 0, 3.5),
        (0, 11.5, 0),
        (36.5, 11.5, 0),
        (36.5, 11.5, 7),
        (0, 11.5, 7),
        (18.25, 23, 7),
    ]]
    fillet(fillet1_edges, radius=FILLET1_R - 0.0001)  # a hair under: the kernel refuses the full size


solid = part.part
